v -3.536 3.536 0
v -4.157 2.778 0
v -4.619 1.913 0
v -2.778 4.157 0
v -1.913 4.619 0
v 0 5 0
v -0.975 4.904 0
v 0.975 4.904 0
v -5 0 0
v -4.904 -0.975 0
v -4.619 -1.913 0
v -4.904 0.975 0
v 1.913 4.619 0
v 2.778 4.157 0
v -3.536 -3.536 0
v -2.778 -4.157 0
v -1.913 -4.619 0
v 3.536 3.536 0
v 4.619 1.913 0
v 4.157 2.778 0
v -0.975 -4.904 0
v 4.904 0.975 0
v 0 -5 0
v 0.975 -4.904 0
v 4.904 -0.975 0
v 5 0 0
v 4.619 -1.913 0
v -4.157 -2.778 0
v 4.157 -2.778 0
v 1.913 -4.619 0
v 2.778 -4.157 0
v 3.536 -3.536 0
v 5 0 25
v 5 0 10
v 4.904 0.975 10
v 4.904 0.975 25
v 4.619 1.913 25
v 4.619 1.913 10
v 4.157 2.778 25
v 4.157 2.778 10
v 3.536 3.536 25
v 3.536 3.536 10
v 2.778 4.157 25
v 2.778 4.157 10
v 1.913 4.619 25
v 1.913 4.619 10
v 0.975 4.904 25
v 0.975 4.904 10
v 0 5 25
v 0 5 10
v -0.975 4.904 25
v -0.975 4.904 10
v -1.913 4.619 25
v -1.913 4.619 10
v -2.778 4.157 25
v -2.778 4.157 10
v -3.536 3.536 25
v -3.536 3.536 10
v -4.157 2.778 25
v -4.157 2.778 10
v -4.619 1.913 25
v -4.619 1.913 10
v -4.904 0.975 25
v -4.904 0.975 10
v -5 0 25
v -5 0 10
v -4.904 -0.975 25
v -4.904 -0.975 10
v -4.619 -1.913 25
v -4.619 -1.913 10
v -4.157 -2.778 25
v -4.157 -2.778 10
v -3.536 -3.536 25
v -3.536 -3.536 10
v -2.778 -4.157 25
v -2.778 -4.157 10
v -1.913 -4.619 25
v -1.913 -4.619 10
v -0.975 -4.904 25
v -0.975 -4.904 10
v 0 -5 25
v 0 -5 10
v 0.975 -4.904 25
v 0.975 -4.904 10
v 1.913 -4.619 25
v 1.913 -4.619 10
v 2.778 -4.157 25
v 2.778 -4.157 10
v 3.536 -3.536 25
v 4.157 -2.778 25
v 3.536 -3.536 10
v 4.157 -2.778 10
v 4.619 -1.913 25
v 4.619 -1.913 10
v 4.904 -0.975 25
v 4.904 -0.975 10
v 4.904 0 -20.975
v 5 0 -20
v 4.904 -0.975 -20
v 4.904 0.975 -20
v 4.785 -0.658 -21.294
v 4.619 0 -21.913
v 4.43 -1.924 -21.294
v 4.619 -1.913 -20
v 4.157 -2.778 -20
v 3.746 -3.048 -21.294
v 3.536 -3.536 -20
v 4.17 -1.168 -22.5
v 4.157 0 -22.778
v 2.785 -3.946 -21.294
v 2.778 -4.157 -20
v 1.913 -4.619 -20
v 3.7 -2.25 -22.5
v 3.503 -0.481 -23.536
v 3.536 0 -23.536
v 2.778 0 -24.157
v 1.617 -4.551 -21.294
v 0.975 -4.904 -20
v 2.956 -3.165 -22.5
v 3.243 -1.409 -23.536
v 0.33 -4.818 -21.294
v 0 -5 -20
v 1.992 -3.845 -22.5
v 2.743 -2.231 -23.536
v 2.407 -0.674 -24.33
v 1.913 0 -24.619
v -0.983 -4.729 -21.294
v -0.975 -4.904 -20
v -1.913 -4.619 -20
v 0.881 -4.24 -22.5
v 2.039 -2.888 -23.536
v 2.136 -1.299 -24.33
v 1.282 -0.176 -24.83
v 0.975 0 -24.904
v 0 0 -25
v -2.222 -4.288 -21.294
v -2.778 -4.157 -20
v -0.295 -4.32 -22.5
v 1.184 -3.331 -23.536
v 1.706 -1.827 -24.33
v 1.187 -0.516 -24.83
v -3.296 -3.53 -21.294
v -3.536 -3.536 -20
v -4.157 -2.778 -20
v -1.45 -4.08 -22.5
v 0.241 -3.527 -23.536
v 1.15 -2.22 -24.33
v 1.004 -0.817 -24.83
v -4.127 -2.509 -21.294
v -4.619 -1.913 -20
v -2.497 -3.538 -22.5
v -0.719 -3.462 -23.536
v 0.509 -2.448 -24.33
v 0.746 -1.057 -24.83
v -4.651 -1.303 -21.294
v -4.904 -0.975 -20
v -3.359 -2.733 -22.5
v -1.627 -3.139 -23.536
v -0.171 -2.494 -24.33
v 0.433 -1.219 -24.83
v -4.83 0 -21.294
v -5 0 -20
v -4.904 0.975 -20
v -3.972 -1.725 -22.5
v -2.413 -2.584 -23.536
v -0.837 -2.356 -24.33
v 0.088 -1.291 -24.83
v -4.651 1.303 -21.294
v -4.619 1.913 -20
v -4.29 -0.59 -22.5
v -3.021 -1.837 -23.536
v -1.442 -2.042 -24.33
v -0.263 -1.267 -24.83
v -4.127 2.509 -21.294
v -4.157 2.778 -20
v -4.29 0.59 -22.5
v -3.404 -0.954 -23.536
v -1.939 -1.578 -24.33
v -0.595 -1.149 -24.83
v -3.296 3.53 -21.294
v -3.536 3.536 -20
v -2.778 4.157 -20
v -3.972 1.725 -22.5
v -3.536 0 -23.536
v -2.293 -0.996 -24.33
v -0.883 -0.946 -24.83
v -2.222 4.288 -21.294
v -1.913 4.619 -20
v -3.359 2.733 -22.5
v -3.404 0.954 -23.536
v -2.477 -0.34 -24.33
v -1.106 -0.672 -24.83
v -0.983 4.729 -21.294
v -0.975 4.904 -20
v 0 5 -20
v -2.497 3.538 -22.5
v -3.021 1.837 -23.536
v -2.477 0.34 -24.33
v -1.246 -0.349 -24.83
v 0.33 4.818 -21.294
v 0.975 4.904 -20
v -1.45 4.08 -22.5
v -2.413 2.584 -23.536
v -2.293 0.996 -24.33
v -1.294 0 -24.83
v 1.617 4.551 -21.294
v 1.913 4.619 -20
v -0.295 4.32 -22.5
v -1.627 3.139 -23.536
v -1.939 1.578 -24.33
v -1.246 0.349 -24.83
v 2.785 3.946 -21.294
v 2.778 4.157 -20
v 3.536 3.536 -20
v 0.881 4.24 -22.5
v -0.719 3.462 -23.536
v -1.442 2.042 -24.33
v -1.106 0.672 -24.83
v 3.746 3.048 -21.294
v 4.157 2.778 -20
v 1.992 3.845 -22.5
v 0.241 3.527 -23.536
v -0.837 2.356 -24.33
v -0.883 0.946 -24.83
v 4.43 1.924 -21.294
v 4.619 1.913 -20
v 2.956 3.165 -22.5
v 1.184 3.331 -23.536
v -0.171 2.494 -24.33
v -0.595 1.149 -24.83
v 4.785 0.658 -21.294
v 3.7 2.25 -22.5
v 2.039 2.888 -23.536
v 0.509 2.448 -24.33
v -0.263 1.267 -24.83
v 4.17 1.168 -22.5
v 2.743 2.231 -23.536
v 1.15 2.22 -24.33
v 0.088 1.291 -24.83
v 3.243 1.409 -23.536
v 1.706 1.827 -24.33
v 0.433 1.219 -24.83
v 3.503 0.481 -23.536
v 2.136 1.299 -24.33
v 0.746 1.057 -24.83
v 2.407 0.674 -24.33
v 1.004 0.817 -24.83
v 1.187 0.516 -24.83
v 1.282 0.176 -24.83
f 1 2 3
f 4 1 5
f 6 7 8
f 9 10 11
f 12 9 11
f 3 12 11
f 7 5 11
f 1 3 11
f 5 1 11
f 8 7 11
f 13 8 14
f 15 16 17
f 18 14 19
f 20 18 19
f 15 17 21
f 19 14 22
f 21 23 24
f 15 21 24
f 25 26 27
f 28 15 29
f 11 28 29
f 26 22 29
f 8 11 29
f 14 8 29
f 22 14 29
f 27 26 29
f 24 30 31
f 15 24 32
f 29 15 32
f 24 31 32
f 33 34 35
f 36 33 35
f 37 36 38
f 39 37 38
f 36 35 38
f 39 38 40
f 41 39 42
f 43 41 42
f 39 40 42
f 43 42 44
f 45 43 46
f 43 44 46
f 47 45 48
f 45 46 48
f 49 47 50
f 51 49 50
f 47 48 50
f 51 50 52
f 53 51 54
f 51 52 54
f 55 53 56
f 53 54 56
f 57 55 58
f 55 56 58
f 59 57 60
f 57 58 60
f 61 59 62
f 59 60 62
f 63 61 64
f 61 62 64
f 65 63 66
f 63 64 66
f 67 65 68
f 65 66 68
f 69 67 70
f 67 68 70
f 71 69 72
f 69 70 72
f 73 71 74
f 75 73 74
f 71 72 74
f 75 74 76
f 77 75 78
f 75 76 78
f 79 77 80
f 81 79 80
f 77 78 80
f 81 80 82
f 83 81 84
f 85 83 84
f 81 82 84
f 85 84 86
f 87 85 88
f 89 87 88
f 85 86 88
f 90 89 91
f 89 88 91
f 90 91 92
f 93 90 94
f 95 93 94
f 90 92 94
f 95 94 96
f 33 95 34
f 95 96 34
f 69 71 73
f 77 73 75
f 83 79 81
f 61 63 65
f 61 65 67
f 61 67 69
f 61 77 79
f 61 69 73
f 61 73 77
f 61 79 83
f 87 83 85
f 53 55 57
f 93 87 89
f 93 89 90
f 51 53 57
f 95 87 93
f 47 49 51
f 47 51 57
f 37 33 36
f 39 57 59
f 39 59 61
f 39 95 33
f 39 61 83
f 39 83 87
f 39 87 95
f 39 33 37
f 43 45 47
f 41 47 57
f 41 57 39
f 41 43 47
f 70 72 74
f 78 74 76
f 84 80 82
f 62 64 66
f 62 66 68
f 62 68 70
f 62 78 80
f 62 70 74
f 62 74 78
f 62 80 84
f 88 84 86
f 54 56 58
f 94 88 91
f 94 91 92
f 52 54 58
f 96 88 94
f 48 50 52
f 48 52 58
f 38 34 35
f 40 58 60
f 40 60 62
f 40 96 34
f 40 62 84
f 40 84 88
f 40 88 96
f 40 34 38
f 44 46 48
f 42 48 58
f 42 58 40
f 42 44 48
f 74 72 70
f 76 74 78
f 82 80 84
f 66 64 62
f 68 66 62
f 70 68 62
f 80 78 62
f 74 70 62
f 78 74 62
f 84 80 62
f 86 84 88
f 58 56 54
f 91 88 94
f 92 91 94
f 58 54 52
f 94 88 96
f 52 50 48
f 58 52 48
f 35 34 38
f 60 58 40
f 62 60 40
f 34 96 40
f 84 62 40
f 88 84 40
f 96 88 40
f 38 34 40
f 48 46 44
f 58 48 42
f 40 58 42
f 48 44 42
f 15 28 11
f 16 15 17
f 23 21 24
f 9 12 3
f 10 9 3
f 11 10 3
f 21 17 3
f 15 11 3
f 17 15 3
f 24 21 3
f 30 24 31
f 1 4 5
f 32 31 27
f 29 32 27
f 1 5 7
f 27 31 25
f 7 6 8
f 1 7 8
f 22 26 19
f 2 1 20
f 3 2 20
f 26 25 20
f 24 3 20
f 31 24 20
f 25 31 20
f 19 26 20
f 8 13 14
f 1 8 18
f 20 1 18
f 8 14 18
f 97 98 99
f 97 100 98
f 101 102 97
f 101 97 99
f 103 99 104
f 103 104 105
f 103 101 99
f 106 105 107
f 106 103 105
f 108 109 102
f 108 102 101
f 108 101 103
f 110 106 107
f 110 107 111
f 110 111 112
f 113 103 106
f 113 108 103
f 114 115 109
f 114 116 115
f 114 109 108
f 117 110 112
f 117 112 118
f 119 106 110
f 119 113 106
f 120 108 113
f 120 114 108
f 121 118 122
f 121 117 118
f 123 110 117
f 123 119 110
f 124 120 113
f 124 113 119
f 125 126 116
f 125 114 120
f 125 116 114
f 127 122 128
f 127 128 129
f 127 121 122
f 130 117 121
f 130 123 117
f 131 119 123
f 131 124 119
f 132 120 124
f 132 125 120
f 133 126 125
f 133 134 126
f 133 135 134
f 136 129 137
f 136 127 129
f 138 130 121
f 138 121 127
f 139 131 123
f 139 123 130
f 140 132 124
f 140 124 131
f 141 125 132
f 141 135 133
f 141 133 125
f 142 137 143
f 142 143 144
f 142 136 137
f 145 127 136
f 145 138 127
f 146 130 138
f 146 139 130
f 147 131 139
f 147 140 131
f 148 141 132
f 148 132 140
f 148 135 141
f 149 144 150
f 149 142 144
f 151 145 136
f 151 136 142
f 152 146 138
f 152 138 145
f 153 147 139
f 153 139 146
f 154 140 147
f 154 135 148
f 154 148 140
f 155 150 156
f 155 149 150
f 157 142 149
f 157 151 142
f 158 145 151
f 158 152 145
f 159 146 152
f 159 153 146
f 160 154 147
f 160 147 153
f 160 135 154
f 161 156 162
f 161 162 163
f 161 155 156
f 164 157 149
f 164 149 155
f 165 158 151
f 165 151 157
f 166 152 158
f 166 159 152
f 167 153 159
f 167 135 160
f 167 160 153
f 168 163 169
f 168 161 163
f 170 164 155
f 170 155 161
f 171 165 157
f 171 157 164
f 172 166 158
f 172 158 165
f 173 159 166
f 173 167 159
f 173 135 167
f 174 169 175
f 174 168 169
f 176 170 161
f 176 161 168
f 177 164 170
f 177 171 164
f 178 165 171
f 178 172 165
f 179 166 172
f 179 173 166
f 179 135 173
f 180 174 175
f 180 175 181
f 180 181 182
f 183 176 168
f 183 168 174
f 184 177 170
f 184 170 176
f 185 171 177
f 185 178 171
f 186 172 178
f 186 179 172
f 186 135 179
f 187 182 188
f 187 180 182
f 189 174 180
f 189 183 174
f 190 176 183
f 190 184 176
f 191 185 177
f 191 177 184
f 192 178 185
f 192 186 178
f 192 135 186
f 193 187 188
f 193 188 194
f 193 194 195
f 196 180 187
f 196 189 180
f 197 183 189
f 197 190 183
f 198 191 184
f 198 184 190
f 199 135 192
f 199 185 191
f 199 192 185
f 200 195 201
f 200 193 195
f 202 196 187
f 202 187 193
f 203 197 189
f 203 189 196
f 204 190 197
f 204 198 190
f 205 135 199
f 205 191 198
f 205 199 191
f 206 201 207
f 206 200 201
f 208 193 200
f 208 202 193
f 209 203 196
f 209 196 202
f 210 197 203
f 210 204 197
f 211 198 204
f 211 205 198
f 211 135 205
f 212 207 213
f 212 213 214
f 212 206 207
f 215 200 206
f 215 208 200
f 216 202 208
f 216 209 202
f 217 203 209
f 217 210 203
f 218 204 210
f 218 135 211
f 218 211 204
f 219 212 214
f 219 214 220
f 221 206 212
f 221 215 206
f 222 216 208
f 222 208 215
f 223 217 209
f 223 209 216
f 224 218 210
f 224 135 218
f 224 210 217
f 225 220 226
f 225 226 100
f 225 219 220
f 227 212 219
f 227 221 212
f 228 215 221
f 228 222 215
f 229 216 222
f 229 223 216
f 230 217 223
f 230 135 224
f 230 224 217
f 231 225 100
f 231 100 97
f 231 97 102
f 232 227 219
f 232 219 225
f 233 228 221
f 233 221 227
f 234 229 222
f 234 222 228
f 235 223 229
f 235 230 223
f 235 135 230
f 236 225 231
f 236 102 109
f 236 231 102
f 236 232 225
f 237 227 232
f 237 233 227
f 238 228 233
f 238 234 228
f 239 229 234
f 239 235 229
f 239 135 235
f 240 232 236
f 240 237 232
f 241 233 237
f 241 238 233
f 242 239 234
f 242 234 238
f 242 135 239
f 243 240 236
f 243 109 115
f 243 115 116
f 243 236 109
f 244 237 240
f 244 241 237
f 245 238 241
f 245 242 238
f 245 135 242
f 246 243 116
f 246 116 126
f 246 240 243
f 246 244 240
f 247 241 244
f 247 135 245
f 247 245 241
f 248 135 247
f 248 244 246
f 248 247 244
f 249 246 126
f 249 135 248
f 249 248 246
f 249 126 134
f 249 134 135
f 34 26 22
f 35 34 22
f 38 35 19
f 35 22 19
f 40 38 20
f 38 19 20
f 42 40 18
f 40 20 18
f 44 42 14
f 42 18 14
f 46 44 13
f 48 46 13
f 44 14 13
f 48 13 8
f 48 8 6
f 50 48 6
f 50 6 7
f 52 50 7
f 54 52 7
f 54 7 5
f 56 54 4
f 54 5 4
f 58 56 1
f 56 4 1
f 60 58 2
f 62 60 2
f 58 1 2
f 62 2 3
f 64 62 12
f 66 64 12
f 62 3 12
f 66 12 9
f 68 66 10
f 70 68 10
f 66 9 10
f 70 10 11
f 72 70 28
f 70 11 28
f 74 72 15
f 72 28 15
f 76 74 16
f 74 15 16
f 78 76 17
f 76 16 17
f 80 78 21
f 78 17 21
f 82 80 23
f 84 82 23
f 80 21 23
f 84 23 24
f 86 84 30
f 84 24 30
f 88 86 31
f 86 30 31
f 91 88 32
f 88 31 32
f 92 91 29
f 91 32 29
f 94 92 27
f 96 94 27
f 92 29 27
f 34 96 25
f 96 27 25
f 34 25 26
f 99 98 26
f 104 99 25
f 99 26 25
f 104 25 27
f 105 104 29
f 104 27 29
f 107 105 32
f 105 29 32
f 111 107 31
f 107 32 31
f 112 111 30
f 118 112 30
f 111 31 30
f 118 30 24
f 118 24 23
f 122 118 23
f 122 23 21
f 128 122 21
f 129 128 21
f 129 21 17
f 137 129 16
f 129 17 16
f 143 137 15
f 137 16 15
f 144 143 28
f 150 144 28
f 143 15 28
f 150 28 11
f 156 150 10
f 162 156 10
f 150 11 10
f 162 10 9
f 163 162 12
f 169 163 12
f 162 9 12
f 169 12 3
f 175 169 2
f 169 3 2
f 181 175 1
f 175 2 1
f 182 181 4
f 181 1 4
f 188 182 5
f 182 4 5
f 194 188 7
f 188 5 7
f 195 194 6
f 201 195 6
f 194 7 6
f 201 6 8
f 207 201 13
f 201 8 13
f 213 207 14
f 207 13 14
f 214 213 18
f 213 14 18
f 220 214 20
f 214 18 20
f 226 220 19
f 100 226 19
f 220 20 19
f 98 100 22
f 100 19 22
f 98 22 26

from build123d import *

# Parameters (mm, degrees)
F0_R     = 5
F1_DEPTH = 10
F2_R     = 5
F3_DEPTH = 15
F4_R     = 5
F5_DEPTH = 25
F6_R     = 5


with BuildPart() as f1:
    # F0 (on Top) → F1 (new body)
    with BuildSketch(Plane.XY):
        Circle(F0_R)
    extrude(amount=F1_DEPTH)


with BuildPart() as f3:
    # F2 (on face) → F3 (new body)
    with BuildSketch(Plane.XY.offset(10)):
        Circle(F2_R)
    extrude(amount=F3_DEPTH)


with BuildPart() as f5:
    # F4 (on face) → F5 (new body)
    with BuildSketch(Plane(origin=(0, 0, 0), x_dir=(1, 0, 0), z_dir=(0, 0, -1))):
        Circle(F4_R)
    extrude(amount=F5_DEPTH)

    # F6
    f6_edges = [f5.edges().sort_by_distance(p)[0] for p in [
        (-5, 0, -25),
    ]]
    fillet(f6_edges, radius=F6_R)


solid = Compound([f1.part, f3.part, f5.part])
